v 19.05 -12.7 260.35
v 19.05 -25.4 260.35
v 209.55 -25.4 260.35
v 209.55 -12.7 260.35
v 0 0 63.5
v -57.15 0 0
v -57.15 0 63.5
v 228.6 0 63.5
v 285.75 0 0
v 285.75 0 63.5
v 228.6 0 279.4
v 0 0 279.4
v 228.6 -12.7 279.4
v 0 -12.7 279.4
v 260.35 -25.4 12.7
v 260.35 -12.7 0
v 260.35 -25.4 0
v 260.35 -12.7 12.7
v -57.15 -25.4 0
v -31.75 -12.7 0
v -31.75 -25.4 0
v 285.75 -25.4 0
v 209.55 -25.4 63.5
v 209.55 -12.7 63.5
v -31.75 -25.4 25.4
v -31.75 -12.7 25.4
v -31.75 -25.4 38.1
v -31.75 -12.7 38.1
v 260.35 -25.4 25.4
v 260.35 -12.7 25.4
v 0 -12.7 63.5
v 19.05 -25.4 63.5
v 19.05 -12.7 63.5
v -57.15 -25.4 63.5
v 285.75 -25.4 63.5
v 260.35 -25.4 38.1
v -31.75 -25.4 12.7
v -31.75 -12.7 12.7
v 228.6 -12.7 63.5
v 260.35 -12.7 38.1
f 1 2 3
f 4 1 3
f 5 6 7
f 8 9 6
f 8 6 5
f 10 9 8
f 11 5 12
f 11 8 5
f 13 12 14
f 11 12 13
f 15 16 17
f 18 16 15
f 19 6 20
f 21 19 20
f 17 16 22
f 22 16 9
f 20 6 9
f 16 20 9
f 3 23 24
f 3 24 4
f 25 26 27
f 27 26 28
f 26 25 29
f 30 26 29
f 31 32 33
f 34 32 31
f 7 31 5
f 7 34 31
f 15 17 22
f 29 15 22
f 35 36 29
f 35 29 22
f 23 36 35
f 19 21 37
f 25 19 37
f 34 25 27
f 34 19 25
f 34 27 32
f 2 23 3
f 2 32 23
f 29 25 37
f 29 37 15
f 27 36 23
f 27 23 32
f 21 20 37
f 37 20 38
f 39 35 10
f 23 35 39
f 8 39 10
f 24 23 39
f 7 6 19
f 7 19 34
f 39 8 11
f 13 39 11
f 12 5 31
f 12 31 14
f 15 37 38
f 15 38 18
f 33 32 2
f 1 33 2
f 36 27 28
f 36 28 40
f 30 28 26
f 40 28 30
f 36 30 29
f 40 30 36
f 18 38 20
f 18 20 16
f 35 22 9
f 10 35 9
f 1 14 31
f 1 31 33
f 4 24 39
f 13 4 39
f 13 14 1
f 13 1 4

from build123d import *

# Parameters (mm, degrees)
F0_W       = 228.6
F0_H       = 279.4
F1_DEPTH   = 25.4
F2_W       = 19.05
F2_H       = 279.4
F3_DEPTH   = 12.7
F4_W       = 19.05
F4_H       = 279.4
F5_DEPTH   = 12.7
F6_W       = 190.5
F6_H       = 19.05
F7_DEPTH   = 12.7
F8_W       = 12.7
F8_H       = 63.5
F9_DEPTH   = 57.15
F10_W      = 12.7
F10_H      = 63.5
F11_DEPTH  = 57.15
F13_DEPTH  = 12.7
F14_W      = 342.9
F14_H      = 12.7
F15_DEPTH  = 12.7
F16_W      = 25.4
F16_H      = 12.7
F17_W      = 25.4
F17_H      = 12.7
F18_W      = 25.4
F18_H      = 12.7
F19_DEPTH  = 12.7
F19_FACE_W = 12.7
F19_FACE_H = 12.7
F20_DEPTH  = 304.8


with BuildPart() as f1:
    # F0 (on Front) → F1 (new body)
    with BuildSketch(Plane.XZ):
        with Locations((114.3, 139.7)):
            Rectangle(F0_W, F0_H)
    extrude(amount=F1_DEPTH)

    # F2 (on face) → F3 (cut)
    with BuildSketch(Plane.XZ.offset(25.4)):
        with Locations((219.075, 139.7)):
            Rectangle(F2_W, F2_H)
    extrude(amount=-F3_DEPTH, mode=Mode.SUBTRACT)

    # F4 (on face) → F5 (cut)
    with BuildSketch(Plane.XZ.offset(25.4)):
        with Locations((9.525, 139.7)):
            Rectangle(F4_W, F4_H)
    extrude(amount=-F5_DEPTH, mode=Mode.SUBTRACT)

    # F6 (on face) → F7 (cut)
    with BuildSketch(Plane.XZ.offset(25.4)):
        with Locations((114.3, 269.875)):
            Rectangle(F6_W, F6_H)
    extrude(amount=-F7_DEPTH, mode=Mode.SUBTRACT)

    # F8 (on face) → F9 (join)
    with BuildSketch(Plane.YZ.offset(228.6)):
        with Locations((-6.35, 31.75)):
            Rectangle(F8_W, F8_H)
    extrude(amount=F9_DEPTH)

    # F10 (on face) → F11 (join)
    with BuildSketch(Plane(origin=(0, 0, 0), x_dir=(0, -1, 0), z_dir=(-1, 0, 0))):
        with Locations((6.35, 31.75)):
            Rectangle(F10_W, F10_H)
    extrude(amount=F11_DEPTH)

    # F12 (on face) → F13 (join)
    with BuildSketch(Plane.XZ.offset(12.7)):
        Polygon((0, 63.5), (-57.15, 63.5), (-57.15, 0), (19.05, 0), (19.05, 63.5), align=None)
        Polygon((285.75, 63.5), (228.6, 63.5), (209.55, 63.5), (209.55, 0), (285.75, 0), align=None)
    extrude(amount=F13_DEPTH)

    # F14 (on face) → F15 (cut)
    with BuildSketch(Plane.XZ.offset(25.4)):
        Polygon((-57.15, 63.5), (-57.15, 50.8), (285.75, 50.8), (285.75, 63.5), (209.55, 63.5), (19.05, 63.5), align=None)
        with Locations((114.3, 31.75)):
            Rectangle(F14_W, F14_H)
        with Locations((114.3, 6.35)):
            Rectangle(F14_W, F14_H)
    extrude(amount=-F15_DEPTH, mode=Mode.SUBTRACT)

    # F16 (on face) + F17 (on face) + F18 (on face) → F19 (join)
    with BuildSketch(Plane.XZ.offset(12.7)):
        with Locations((-44.45, 57.15)):
            Rectangle(F16_W, F16_H)
        with Locations((273.05, 57.15)):
            Rectangle(F16_W, F16_H)
    with BuildSketch(Plane.XZ.offset(12.7)):
        with Locations((-44.45, 31.75)):
            Rectangle(F17_W, F17_H)
        with Locations((273.05, 31.75)):
            Rectangle(F17_W, F17_H)
    with BuildSketch(Plane.XZ.offset(12.7)):
        with Locations((-44.45, 6.35)):
            Rectangle(F18_W, F18_H)
        with Locations((273.05, 6.35)):
            Rectangle(F18_W, F18_H)
    extrude(amount=F19_DEPTH)

    # F19_face (on face) → F20 (join)
    with BuildSketch(Plane(origin=(-31.75, -19.05, 57.15), x_dir=(0, 1, 0), z_dir=(1, 0, 0))):
        Rectangle(F19_FACE_W, F19_FACE_H)
    extrude(amount=F20_DEPTH)


solid = f1.part
